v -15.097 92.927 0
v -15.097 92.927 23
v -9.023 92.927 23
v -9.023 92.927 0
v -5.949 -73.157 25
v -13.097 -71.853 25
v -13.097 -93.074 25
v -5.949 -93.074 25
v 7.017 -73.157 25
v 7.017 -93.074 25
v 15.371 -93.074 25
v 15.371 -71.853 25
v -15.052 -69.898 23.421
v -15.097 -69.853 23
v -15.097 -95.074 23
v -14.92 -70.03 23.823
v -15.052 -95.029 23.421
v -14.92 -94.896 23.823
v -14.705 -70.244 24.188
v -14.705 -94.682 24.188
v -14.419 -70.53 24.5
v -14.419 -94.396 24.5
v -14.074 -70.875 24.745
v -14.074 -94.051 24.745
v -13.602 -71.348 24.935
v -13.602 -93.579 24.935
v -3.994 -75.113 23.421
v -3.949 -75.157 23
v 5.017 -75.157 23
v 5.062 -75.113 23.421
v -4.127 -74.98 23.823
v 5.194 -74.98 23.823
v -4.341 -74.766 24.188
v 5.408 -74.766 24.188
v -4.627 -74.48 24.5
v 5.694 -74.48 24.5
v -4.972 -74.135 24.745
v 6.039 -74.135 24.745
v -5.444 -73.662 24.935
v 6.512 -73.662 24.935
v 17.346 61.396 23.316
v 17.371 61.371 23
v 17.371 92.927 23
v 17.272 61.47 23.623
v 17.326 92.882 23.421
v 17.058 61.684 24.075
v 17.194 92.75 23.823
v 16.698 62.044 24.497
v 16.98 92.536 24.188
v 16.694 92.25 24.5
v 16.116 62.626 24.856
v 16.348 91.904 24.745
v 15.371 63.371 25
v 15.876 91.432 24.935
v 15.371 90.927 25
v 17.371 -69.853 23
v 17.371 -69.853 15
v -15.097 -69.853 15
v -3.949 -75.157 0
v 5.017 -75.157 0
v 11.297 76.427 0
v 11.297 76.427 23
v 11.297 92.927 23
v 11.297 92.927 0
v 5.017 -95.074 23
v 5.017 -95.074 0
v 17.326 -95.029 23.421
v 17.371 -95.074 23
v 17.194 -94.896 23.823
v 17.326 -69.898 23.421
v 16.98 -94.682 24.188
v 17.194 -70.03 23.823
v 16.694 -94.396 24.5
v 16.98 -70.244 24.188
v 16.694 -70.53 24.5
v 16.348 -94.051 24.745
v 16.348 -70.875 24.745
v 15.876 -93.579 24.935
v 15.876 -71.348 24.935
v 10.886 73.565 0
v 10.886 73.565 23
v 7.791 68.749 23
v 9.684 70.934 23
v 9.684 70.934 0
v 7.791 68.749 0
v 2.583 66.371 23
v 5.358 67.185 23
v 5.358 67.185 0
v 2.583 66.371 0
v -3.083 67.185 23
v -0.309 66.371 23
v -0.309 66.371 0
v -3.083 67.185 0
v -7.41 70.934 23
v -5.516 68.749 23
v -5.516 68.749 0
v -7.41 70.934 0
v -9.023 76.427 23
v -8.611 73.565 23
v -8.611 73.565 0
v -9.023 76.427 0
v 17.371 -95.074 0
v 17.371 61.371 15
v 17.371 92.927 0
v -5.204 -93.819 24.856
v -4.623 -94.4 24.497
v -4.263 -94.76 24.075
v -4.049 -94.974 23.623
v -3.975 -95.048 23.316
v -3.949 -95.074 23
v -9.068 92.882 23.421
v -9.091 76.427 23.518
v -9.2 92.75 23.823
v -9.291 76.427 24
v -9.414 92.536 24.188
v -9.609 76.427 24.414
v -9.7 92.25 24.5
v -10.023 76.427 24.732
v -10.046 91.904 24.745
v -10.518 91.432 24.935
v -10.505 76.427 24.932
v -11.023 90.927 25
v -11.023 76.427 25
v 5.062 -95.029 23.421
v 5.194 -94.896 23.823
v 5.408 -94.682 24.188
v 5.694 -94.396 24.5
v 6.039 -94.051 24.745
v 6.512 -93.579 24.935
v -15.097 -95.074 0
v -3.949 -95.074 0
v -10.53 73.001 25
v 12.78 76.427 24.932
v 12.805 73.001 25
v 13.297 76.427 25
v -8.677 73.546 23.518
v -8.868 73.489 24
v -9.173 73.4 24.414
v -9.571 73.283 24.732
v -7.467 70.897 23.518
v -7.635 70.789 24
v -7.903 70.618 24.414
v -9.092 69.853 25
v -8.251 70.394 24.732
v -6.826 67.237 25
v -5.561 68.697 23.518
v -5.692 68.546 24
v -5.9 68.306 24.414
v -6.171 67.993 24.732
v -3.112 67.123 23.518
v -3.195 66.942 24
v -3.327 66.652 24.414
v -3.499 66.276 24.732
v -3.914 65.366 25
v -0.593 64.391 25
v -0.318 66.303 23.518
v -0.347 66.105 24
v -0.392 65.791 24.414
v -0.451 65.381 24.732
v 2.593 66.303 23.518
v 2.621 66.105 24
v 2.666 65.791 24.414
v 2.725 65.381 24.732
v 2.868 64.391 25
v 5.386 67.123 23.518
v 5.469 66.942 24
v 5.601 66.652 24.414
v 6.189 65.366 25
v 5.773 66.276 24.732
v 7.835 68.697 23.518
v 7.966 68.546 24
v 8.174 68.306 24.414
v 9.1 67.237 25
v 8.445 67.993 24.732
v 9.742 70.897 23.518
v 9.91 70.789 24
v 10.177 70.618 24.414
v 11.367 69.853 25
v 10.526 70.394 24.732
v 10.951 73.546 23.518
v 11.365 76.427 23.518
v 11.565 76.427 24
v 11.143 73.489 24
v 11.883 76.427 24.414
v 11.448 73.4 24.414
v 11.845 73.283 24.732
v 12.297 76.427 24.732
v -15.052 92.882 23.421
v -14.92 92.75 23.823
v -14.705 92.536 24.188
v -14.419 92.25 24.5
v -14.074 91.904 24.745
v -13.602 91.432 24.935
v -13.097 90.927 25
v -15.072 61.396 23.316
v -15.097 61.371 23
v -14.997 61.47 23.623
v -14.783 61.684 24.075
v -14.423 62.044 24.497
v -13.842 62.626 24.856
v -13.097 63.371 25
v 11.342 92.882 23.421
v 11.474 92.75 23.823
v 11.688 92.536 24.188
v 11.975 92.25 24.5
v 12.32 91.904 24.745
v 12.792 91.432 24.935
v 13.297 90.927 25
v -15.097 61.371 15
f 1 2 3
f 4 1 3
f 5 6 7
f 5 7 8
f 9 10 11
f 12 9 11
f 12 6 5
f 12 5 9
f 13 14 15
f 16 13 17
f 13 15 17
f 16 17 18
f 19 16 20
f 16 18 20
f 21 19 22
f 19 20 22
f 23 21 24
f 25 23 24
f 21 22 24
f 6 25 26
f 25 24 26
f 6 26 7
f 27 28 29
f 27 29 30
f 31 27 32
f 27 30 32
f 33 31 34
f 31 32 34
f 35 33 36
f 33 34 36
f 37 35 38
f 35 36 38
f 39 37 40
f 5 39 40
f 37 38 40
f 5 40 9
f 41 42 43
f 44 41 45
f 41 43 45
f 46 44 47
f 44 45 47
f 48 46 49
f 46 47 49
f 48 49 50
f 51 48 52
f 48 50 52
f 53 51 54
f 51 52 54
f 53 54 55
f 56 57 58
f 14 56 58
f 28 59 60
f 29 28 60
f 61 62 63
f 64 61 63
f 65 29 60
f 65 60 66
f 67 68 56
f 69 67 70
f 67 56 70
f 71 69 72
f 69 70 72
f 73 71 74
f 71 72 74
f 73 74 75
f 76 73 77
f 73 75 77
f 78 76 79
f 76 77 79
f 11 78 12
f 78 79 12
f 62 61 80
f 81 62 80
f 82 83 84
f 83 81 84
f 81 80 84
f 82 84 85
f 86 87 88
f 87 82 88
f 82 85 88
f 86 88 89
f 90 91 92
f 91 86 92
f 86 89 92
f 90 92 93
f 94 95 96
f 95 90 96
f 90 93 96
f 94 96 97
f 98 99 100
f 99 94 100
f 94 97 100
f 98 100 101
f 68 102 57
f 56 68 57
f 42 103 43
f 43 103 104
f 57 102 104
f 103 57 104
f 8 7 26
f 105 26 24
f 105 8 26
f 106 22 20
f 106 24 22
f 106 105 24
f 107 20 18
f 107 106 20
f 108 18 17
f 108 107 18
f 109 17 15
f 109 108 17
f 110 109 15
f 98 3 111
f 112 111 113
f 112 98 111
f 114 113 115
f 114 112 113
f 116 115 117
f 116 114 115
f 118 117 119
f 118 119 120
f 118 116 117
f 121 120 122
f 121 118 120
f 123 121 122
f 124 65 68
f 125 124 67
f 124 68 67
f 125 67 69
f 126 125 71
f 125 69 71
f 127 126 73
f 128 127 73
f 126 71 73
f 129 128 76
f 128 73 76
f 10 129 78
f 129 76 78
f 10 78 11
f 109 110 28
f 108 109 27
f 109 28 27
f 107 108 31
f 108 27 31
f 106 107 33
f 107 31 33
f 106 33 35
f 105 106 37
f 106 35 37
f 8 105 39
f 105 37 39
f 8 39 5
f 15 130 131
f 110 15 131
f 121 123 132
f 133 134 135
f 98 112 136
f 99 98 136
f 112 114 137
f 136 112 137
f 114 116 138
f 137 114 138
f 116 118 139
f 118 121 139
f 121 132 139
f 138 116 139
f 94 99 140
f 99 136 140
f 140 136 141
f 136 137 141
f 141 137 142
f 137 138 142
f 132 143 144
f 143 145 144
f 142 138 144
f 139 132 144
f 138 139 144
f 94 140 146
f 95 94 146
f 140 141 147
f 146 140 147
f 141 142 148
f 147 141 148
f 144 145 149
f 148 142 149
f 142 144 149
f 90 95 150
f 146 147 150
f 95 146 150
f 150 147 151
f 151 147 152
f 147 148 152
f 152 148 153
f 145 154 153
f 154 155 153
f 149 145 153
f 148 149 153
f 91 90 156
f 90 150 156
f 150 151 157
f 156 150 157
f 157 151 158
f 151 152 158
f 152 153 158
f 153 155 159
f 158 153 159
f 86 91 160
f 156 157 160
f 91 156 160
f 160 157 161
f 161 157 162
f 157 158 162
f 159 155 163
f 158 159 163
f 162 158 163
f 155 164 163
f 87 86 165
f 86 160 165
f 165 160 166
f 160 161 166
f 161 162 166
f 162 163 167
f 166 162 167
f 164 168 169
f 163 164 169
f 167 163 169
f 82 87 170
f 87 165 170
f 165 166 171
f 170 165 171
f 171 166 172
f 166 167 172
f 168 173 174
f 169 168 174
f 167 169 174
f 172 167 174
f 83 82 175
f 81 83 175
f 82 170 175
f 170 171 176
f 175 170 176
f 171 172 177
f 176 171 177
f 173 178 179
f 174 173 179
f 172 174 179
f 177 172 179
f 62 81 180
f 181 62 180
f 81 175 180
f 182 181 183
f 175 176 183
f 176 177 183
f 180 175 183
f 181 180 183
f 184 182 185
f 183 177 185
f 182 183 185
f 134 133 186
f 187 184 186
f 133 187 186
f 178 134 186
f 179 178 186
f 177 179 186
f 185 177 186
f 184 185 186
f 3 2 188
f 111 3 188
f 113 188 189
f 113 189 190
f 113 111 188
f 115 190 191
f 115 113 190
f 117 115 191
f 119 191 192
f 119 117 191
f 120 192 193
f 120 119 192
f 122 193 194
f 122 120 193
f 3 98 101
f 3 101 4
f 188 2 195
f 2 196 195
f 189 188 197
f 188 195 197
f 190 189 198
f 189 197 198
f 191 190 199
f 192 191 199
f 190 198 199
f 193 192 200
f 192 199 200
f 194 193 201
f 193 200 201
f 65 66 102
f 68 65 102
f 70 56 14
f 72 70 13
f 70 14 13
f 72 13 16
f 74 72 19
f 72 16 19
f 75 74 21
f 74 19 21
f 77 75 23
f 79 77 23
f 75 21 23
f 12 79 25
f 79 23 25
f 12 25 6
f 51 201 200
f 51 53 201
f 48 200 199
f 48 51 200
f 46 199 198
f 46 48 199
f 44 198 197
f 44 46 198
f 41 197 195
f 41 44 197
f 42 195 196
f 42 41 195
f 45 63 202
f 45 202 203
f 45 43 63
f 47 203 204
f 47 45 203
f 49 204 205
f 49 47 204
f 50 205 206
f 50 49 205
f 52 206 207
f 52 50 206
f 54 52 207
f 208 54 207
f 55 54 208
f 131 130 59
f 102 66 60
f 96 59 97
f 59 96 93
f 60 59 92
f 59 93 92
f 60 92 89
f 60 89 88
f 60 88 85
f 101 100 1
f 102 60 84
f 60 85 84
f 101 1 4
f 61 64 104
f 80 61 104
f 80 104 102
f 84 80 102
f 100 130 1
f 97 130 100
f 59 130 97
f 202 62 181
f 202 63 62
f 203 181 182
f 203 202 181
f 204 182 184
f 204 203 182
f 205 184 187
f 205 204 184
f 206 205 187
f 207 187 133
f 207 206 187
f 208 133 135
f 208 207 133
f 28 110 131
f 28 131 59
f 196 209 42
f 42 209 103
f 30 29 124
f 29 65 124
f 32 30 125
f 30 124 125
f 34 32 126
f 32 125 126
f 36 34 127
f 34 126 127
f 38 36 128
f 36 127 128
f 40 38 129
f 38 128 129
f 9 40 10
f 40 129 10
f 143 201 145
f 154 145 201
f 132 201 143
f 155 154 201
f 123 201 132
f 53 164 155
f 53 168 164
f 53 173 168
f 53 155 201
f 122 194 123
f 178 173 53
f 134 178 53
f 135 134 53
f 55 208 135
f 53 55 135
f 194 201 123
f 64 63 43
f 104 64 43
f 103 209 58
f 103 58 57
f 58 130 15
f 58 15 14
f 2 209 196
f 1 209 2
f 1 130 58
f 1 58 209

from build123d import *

# Parameters (mm, degrees)
F1_DEPTH = 25
F0_W     = 6.0739132134
F0_H     = 16.4999708235
F0_W_2   = 32.4678264267
F0_H_2   = 131.2236316204
F2_DEPTH = 15
F3_R     = 2


with BuildPart() as f1:
    # F0 (on Top) → F1 (new body)
    with BuildSketch(Plane.XY):
        Polygon((17.3710967268, -69.8527075052), (-15.0967296999, -69.8527075052), (-15.0967296999, -95.0735285878), (-3.9494665107, -95.0735285878), (-3.9494665107, -75.1573219895), (5.0167334893, -75.1573219895), (5.0167334893, -95.0735285878), (17.3710967268, -95.0735285878), align=None)
    extrude(amount=F1_DEPTH)



with BuildPart() as f1b:
    # F0 (on Top) → F1, piece 2 (new body)
    with BuildSketch(Plane.XY):
        with BuildLine():
            Line((-9.0228164865, 76.4271907806), (-15.0967296999, 76.4271907806))
            Line((-15.0967296999, 76.4271907806), (-15.0967296999, 61.3709241152))
            Line((-15.0967296999, 61.3709241152), (17.3710967268, 61.3709241152))
            Line((17.3710967268, 61.3709241152), (17.3710967268, 76.4271907806))
            Line((17.3710967268, 76.4271907806), (11.2971835135, 76.4271907806))
            ThreePointArc((11.2971835135, 76.4271907806), (1.1371835135, 66.2671907806), (-9.0228164865, 76.4271907806))
        make_face()
        with Locations((14.3341401202, 84.6771761924)):
            Rectangle(F0_W, F0_H)
        with Locations((-12.0597730932, 84.6771761924)):
            Rectangle(F0_W, F0_H)
    extrude(amount=F1_DEPTH)


with BuildPart() as f1_1:
    add(f1.part)

    add(f1b.part)  # F2 merges F1b
    # F0 (on Top) → F2 (join)
    with BuildSketch(Plane.XY):
        with Locations((1.1371835135, -4.240891695)):
            Rectangle(F0_W_2, F0_H_2)
    extrude(amount=F2_DEPTH)

    # F3
    f3_edges = [f1_1.edges().sort_by_distance(p)[0] for p in [
        (1.137184, 61.370924, 25),
        (17.371097, 77.149043, 25),
        (14.33414, 92.927162, 25),
        (11.297184, 84.677176, 25),
        (1.137184, 66.267191, 25),
        (-9.022816, 84.677176, 25),
        (-12.059773, 92.927162, 25),
        (-15.09673, 77.149043, 25),
        (17.371097, -82.463118, 25),
        (1.137184, -69.852708, 25),
        (-15.09673, -82.463118, 25),
        (-9.523098, -95.073529, 25),
        (-3.949467, -85.115425, 25),
        (0.533633, -75.157322, 25),
        (5.016733, -85.115425, 25),
        (11.193915, -95.073529, 25),
    ]]
    fillet(f3_edges, radius=F3_R)


solid = f1_1.part
